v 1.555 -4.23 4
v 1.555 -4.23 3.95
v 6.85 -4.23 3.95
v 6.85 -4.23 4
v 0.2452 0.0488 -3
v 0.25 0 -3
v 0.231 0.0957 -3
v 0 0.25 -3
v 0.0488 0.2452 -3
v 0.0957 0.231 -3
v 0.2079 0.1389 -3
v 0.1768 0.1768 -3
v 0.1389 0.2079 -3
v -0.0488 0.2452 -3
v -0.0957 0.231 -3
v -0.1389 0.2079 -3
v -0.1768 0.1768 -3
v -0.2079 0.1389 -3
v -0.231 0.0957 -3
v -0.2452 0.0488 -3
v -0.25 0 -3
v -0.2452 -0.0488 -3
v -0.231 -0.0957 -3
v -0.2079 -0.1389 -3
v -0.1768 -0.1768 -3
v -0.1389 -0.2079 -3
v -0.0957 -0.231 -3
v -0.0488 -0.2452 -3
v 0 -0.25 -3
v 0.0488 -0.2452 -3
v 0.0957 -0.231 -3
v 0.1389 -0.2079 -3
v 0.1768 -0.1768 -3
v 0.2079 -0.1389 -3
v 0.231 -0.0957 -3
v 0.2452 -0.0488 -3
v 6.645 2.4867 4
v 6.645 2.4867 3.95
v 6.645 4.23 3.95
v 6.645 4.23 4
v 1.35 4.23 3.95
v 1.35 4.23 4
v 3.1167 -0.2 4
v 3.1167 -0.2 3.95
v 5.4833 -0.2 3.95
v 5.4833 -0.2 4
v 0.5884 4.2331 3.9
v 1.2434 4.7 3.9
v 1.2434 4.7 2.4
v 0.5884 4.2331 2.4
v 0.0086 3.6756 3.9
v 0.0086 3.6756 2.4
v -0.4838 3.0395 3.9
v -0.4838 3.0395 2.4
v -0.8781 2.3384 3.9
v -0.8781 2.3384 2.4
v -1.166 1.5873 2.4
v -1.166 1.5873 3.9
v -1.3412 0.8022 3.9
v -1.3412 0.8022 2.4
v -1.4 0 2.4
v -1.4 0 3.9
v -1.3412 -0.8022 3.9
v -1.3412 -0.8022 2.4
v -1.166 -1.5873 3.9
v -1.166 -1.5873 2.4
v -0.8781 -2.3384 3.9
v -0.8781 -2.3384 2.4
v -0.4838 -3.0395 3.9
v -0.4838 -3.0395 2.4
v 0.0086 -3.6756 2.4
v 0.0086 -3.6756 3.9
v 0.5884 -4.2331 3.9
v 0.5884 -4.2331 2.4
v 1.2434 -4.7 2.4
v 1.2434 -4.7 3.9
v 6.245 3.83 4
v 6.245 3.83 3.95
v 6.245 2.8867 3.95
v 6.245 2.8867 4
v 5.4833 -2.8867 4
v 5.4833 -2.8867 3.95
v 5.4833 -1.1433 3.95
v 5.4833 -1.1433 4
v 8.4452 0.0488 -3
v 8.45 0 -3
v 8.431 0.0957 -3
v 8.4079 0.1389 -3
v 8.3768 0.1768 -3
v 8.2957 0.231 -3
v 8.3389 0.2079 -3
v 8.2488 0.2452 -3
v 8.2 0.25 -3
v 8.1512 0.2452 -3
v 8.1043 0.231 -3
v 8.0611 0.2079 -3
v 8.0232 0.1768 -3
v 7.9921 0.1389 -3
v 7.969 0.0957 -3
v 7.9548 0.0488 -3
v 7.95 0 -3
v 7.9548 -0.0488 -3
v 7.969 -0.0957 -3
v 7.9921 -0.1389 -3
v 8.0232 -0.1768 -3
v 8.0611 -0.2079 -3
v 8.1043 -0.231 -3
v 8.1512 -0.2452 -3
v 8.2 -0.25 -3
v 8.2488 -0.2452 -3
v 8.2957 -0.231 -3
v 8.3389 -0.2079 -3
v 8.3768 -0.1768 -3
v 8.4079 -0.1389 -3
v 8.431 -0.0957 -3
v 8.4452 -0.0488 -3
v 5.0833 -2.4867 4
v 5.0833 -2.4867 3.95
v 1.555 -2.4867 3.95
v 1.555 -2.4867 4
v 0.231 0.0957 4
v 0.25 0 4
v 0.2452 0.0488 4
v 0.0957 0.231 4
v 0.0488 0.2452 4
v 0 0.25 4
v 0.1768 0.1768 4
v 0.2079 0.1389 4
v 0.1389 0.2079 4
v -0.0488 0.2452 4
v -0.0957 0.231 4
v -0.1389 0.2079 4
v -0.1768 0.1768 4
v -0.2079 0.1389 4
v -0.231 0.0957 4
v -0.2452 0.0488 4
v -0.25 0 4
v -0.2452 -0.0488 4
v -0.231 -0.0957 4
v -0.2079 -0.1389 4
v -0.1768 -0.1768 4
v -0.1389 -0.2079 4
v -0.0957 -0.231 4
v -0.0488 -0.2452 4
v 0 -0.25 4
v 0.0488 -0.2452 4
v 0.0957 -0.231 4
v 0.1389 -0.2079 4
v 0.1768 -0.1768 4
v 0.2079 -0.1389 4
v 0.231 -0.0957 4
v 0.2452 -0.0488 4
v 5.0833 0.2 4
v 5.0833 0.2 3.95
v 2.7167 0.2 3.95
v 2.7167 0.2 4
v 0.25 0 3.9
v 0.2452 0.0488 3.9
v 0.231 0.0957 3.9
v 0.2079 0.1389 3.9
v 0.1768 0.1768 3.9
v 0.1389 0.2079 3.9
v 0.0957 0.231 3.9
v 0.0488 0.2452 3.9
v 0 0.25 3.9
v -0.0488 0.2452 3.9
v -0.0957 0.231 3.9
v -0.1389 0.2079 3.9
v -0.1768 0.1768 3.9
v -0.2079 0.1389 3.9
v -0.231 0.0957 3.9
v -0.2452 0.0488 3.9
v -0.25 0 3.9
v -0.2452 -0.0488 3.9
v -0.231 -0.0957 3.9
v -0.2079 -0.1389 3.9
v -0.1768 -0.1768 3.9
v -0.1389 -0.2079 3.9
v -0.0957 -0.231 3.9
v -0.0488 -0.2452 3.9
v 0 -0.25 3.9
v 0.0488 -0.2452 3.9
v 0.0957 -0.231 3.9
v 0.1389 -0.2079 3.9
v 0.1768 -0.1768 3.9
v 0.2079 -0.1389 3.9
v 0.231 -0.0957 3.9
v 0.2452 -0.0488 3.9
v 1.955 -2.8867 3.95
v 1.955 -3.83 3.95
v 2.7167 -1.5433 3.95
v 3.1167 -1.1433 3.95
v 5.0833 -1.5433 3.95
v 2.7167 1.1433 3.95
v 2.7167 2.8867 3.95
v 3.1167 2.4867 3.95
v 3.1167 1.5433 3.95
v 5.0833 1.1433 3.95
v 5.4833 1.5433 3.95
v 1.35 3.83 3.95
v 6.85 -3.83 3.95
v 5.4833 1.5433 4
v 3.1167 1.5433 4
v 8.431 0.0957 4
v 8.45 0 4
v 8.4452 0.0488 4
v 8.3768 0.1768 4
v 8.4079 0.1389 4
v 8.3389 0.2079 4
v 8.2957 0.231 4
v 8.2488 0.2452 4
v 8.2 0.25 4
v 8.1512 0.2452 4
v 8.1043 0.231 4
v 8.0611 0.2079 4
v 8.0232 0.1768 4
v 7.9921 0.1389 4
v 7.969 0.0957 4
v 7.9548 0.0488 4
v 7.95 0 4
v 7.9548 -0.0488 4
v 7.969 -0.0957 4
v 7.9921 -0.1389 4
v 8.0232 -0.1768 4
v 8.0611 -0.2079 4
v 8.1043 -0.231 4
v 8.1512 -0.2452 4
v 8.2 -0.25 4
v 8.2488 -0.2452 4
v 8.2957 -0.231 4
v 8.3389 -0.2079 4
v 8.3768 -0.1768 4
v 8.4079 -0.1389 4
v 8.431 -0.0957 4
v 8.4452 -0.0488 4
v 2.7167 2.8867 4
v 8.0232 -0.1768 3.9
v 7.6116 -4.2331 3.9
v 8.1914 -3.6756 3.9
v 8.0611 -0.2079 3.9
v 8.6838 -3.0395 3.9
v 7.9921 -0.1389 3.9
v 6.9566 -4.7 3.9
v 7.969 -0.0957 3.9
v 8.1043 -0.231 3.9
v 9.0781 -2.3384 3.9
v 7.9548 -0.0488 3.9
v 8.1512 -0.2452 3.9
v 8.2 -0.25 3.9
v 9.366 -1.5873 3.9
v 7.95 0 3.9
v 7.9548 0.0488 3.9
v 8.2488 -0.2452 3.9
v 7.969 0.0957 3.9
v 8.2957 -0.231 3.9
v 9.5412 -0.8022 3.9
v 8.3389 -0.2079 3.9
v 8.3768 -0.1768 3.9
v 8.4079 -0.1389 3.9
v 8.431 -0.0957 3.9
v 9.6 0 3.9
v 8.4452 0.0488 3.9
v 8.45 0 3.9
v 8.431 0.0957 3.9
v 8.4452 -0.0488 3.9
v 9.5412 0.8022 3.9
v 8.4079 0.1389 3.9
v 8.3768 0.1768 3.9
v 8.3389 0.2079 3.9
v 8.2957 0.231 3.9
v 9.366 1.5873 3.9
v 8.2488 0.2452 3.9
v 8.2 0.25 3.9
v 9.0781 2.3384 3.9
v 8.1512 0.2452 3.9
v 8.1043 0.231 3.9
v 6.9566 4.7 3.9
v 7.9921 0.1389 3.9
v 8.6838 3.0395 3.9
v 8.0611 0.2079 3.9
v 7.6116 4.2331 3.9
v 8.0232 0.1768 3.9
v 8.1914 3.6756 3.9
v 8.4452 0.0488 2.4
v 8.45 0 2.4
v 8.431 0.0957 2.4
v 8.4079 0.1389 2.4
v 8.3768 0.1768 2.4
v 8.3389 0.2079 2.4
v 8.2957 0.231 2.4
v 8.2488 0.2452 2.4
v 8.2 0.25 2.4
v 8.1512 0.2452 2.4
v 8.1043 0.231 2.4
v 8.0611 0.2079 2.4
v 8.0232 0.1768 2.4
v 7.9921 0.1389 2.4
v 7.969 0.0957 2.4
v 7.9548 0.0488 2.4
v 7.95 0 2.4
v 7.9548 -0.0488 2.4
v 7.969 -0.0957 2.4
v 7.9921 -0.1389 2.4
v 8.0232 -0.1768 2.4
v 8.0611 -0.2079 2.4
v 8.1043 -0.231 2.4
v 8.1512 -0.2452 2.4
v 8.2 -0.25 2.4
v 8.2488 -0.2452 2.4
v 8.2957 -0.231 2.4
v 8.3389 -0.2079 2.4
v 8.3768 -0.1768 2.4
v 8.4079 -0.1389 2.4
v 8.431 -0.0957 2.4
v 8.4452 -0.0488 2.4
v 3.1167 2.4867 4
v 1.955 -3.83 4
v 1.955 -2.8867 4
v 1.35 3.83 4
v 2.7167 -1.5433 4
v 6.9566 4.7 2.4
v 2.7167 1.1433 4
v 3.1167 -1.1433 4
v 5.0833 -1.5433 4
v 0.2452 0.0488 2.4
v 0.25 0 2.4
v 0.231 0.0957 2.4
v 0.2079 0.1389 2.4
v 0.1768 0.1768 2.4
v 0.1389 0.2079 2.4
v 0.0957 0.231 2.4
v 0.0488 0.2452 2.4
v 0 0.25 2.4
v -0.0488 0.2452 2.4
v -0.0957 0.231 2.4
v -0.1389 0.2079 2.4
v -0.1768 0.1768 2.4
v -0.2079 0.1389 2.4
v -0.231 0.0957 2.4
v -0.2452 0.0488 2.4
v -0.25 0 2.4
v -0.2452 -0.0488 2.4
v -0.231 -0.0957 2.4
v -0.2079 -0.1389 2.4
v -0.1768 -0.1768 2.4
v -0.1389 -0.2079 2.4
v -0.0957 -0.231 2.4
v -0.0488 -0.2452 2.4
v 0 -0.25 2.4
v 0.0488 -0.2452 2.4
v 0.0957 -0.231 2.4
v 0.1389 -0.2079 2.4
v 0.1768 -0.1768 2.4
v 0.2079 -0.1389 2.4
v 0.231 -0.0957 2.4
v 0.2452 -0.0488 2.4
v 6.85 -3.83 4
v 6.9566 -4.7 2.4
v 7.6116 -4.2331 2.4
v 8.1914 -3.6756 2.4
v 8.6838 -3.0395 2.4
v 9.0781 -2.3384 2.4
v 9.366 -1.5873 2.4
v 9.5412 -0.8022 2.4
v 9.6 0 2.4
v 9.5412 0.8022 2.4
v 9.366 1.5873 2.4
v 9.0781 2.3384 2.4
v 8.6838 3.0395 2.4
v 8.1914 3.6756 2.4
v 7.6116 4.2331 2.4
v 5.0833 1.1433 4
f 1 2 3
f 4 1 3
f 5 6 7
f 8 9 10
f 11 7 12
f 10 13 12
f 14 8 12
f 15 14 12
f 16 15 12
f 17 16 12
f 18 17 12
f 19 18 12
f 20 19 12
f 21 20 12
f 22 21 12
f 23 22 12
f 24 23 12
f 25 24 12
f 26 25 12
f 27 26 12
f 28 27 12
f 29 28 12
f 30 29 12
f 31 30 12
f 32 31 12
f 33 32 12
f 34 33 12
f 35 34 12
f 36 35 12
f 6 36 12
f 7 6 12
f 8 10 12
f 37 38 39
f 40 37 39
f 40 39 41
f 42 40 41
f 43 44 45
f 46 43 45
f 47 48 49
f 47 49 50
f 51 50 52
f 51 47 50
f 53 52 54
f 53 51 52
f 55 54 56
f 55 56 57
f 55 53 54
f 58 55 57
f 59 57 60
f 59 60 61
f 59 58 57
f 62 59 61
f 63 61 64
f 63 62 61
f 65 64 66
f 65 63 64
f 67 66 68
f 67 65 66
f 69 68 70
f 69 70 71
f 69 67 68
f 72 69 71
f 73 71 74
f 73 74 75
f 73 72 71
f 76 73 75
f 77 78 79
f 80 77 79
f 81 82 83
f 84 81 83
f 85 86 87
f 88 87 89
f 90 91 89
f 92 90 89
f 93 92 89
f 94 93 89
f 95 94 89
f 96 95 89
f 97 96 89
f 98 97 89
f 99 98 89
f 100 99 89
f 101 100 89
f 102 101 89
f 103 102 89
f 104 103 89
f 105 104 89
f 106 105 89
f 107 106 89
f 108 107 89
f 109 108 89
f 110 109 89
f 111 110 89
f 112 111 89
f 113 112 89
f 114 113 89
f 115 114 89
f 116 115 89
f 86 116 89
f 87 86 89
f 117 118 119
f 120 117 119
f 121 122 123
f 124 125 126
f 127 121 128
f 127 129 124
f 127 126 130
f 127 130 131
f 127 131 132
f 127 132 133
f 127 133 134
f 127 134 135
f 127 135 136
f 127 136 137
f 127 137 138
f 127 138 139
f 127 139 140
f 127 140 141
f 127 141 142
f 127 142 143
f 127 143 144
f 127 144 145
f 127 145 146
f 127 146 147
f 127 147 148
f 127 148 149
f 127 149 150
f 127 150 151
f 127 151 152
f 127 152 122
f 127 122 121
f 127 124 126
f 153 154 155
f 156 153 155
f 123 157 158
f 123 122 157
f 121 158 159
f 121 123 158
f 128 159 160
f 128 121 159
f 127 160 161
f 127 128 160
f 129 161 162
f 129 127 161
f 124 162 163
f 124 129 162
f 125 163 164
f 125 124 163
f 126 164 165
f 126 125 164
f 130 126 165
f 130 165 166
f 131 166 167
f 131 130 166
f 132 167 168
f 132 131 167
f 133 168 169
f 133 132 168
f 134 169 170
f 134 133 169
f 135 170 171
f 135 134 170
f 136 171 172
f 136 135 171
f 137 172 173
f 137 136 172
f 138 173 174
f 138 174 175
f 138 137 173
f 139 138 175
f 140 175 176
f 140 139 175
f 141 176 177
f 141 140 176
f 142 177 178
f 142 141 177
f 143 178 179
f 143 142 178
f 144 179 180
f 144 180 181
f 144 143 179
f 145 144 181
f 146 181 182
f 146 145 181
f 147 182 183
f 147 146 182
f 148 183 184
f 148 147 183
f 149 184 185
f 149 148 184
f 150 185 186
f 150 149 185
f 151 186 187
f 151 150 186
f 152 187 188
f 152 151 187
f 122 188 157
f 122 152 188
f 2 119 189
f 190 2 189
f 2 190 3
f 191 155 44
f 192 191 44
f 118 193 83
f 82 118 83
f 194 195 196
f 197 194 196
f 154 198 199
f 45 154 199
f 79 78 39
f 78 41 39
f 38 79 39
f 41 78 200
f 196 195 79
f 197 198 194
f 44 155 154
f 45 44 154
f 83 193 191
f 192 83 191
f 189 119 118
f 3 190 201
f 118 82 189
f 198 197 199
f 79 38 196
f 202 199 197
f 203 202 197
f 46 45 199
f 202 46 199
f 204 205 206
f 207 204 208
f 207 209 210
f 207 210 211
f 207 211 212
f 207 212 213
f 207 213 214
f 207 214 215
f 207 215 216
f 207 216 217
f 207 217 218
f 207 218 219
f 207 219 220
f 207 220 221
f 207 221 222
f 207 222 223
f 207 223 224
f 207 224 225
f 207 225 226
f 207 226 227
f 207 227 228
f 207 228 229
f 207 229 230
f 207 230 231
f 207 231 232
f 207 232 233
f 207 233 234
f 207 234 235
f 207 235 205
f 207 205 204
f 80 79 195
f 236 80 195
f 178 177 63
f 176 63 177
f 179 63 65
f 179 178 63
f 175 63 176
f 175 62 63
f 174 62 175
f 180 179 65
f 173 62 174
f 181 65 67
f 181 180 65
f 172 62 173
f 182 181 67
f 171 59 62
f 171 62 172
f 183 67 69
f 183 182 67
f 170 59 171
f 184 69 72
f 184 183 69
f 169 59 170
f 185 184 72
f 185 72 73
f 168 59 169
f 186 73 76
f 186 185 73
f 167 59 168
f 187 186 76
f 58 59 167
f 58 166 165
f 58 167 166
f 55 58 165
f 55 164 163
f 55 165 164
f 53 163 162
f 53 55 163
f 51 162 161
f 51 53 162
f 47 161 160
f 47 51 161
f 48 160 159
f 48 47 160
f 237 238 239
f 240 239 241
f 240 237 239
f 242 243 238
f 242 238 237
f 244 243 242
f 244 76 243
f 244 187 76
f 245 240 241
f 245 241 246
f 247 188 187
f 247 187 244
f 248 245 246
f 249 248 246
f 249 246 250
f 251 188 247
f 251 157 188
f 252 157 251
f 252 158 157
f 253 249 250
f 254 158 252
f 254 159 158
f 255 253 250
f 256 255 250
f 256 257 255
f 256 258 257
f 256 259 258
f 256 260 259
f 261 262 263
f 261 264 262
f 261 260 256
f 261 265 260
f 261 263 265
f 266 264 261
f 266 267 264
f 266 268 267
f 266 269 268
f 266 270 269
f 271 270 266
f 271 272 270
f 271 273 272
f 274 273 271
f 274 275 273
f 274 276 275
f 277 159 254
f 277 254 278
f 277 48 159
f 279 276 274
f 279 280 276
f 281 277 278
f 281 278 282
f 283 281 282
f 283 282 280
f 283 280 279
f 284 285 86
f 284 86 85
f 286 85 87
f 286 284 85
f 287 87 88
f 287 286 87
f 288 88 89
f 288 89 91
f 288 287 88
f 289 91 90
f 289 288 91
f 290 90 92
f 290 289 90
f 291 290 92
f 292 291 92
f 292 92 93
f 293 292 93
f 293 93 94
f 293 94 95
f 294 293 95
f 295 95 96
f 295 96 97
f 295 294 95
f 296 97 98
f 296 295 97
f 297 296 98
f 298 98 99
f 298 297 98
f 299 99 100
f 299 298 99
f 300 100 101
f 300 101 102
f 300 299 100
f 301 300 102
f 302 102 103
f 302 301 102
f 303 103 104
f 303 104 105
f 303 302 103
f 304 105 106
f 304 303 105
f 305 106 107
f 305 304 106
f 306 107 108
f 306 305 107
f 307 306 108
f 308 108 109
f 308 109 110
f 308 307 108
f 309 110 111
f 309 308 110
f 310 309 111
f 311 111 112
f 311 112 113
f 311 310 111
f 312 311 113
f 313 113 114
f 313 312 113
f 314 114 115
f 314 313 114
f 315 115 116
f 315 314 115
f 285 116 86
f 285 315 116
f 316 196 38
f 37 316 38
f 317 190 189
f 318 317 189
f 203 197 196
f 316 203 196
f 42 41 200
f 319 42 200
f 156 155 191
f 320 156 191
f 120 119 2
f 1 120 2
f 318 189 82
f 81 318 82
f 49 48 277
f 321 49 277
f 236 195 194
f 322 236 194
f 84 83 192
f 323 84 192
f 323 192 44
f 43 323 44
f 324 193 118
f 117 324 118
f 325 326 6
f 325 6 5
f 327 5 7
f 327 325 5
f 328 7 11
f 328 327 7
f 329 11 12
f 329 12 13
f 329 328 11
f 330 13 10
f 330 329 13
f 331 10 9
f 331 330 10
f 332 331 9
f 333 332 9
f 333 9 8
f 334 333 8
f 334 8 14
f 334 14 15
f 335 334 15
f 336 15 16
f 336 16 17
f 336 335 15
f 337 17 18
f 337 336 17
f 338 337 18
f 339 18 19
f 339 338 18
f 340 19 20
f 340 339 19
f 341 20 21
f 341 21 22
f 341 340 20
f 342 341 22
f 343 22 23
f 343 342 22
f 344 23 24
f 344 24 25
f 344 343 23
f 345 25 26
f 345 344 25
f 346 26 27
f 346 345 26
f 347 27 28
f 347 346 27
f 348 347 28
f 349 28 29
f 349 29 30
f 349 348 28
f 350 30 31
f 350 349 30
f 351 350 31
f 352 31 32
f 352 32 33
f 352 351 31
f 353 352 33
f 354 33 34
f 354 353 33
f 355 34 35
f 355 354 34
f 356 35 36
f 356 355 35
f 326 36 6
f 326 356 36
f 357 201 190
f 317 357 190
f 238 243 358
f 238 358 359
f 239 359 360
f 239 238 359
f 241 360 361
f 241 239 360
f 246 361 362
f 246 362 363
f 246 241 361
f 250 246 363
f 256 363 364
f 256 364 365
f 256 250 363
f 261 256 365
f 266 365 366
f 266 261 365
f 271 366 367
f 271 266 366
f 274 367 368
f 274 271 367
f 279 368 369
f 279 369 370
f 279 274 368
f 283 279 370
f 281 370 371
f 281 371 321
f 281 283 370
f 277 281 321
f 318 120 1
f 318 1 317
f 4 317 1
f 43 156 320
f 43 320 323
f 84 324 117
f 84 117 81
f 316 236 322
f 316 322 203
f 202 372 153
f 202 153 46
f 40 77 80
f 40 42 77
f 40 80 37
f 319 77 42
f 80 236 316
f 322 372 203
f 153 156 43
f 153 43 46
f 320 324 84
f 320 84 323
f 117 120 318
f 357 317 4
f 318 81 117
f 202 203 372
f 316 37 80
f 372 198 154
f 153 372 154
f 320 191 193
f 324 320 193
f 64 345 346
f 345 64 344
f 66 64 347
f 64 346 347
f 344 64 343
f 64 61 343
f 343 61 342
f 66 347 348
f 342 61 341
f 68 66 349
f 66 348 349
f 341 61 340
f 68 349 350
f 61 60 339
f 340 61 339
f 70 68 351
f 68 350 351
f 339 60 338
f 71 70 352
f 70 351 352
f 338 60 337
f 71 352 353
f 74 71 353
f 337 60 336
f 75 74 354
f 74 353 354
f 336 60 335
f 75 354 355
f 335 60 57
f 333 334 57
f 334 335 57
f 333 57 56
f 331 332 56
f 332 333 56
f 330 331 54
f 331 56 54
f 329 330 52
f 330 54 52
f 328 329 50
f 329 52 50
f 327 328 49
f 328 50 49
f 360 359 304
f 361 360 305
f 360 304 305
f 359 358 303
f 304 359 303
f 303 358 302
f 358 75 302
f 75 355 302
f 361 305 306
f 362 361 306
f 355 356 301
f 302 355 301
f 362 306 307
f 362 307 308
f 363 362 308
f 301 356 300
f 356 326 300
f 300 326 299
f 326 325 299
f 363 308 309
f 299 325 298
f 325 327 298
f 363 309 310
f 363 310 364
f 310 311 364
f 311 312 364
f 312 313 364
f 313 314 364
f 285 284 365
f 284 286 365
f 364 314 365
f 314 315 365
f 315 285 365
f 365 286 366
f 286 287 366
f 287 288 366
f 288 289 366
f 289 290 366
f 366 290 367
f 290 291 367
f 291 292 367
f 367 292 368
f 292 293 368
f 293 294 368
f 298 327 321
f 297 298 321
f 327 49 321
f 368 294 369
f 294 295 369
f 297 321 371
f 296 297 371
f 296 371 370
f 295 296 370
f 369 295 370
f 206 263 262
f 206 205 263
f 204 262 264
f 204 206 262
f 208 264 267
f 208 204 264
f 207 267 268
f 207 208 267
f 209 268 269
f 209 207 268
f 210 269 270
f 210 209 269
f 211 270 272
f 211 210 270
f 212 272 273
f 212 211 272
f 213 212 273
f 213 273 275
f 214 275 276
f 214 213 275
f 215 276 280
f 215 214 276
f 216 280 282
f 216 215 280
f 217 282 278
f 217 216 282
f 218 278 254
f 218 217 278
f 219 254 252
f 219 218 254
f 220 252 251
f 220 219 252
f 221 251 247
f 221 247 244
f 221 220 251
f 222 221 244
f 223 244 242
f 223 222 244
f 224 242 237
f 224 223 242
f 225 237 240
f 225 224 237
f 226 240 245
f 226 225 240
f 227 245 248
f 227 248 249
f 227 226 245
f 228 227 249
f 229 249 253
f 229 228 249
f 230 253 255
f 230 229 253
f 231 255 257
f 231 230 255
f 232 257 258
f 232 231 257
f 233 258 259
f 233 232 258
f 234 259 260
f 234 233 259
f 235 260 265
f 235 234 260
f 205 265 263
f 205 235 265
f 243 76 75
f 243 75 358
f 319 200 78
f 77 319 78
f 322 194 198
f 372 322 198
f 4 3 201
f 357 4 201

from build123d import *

# Parameters (mm, degrees)
PAD001_DEPTH   = 1.5
SKETCH_R       = 0.25
PAD_DEPTH      = 4
PAD_DEPTH_BACK = 3
PAD002_DEPTH   = 0.05


with BuildPart() as pad001:
    # Sketch001 → Pad001 (new body)
    with BuildSketch(Plane.XY.offset(3.9)):
        with BuildLine():
            ThreePointArc((1.243429, 4.7), (-1.4, 0), (1.243429, -4.7))
            Line((1.243429, -4.7), (6.956571, -4.7))
            ThreePointArc((6.956571, -4.7), (9.6, 0), (6.956571, 4.7))
            Line((1.243429, 4.7), (6.956571, 4.7))
        make_face()
    extrude(amount=-PAD001_DEPTH)


with BuildPart() as pad:
    # Sketch → Pad (new body, two sides)
    with BuildSketch(Plane.XY) as pad_sk:
        Circle(SKETCH_R)
        with Locations((8.2, 0)):
            Circle(SKETCH_R)
    extrude(amount=PAD_DEPTH)
    extrude(pad_sk.sketch, amount=-PAD_DEPTH_BACK)


with BuildPart() as r_ldr_11x9_4mm_p8_2mm_vertical:
    # Sketch002 → Pad002 (new body)
    with BuildSketch(Plane.XY.offset(3.95)):
        Polygon((1.35, 3.83), (6.245, 3.83), (6.245, 2.886667), (2.716667, 2.886667), (2.716667, 2.486667), (2.716667, 1.143333), (3.116667, 1.143333), (5.083333, 1.143333), (5.083333, 0.2), (2.716667, 0.2), (2.716667, -0.2), (2.716667, -1.543333), (3.116667, -1.543333), (5.083333, -1.543333), (5.083333, -2.486667), (1.555, -2.486667), (1.555, -2.886667), (1.555, -4.23), (1.955, -4.23), (6.85, -4.23), (6.85, -3.83), (1.955, -3.83), (1.955, -2.886667), (5.083333, -2.886667), (5.483333, -2.886667), (5.483333, -1.543333), (5.483333, -1.143333), (3.116667, -1.143333), (3.116667, -0.2), (5.083333, -0.2), (5.483333, -0.2), (5.483333, 1.143333), (5.483333, 1.543333), (3.116667, 1.543333), (3.116667, 2.486667), (6.245, 2.486667), (6.645, 2.486667), (6.645, 3.83), (6.645, 4.23), (1.35, 4.23), align=None)
    extrude(amount=PAD002_DEPTH)

    # Pad002_mp_cp: union Pad001, Pad
    add(pad001.part)
    add(pad.part)


solid = r_ldr_11x9_4mm_p8_2mm_vertical.part
